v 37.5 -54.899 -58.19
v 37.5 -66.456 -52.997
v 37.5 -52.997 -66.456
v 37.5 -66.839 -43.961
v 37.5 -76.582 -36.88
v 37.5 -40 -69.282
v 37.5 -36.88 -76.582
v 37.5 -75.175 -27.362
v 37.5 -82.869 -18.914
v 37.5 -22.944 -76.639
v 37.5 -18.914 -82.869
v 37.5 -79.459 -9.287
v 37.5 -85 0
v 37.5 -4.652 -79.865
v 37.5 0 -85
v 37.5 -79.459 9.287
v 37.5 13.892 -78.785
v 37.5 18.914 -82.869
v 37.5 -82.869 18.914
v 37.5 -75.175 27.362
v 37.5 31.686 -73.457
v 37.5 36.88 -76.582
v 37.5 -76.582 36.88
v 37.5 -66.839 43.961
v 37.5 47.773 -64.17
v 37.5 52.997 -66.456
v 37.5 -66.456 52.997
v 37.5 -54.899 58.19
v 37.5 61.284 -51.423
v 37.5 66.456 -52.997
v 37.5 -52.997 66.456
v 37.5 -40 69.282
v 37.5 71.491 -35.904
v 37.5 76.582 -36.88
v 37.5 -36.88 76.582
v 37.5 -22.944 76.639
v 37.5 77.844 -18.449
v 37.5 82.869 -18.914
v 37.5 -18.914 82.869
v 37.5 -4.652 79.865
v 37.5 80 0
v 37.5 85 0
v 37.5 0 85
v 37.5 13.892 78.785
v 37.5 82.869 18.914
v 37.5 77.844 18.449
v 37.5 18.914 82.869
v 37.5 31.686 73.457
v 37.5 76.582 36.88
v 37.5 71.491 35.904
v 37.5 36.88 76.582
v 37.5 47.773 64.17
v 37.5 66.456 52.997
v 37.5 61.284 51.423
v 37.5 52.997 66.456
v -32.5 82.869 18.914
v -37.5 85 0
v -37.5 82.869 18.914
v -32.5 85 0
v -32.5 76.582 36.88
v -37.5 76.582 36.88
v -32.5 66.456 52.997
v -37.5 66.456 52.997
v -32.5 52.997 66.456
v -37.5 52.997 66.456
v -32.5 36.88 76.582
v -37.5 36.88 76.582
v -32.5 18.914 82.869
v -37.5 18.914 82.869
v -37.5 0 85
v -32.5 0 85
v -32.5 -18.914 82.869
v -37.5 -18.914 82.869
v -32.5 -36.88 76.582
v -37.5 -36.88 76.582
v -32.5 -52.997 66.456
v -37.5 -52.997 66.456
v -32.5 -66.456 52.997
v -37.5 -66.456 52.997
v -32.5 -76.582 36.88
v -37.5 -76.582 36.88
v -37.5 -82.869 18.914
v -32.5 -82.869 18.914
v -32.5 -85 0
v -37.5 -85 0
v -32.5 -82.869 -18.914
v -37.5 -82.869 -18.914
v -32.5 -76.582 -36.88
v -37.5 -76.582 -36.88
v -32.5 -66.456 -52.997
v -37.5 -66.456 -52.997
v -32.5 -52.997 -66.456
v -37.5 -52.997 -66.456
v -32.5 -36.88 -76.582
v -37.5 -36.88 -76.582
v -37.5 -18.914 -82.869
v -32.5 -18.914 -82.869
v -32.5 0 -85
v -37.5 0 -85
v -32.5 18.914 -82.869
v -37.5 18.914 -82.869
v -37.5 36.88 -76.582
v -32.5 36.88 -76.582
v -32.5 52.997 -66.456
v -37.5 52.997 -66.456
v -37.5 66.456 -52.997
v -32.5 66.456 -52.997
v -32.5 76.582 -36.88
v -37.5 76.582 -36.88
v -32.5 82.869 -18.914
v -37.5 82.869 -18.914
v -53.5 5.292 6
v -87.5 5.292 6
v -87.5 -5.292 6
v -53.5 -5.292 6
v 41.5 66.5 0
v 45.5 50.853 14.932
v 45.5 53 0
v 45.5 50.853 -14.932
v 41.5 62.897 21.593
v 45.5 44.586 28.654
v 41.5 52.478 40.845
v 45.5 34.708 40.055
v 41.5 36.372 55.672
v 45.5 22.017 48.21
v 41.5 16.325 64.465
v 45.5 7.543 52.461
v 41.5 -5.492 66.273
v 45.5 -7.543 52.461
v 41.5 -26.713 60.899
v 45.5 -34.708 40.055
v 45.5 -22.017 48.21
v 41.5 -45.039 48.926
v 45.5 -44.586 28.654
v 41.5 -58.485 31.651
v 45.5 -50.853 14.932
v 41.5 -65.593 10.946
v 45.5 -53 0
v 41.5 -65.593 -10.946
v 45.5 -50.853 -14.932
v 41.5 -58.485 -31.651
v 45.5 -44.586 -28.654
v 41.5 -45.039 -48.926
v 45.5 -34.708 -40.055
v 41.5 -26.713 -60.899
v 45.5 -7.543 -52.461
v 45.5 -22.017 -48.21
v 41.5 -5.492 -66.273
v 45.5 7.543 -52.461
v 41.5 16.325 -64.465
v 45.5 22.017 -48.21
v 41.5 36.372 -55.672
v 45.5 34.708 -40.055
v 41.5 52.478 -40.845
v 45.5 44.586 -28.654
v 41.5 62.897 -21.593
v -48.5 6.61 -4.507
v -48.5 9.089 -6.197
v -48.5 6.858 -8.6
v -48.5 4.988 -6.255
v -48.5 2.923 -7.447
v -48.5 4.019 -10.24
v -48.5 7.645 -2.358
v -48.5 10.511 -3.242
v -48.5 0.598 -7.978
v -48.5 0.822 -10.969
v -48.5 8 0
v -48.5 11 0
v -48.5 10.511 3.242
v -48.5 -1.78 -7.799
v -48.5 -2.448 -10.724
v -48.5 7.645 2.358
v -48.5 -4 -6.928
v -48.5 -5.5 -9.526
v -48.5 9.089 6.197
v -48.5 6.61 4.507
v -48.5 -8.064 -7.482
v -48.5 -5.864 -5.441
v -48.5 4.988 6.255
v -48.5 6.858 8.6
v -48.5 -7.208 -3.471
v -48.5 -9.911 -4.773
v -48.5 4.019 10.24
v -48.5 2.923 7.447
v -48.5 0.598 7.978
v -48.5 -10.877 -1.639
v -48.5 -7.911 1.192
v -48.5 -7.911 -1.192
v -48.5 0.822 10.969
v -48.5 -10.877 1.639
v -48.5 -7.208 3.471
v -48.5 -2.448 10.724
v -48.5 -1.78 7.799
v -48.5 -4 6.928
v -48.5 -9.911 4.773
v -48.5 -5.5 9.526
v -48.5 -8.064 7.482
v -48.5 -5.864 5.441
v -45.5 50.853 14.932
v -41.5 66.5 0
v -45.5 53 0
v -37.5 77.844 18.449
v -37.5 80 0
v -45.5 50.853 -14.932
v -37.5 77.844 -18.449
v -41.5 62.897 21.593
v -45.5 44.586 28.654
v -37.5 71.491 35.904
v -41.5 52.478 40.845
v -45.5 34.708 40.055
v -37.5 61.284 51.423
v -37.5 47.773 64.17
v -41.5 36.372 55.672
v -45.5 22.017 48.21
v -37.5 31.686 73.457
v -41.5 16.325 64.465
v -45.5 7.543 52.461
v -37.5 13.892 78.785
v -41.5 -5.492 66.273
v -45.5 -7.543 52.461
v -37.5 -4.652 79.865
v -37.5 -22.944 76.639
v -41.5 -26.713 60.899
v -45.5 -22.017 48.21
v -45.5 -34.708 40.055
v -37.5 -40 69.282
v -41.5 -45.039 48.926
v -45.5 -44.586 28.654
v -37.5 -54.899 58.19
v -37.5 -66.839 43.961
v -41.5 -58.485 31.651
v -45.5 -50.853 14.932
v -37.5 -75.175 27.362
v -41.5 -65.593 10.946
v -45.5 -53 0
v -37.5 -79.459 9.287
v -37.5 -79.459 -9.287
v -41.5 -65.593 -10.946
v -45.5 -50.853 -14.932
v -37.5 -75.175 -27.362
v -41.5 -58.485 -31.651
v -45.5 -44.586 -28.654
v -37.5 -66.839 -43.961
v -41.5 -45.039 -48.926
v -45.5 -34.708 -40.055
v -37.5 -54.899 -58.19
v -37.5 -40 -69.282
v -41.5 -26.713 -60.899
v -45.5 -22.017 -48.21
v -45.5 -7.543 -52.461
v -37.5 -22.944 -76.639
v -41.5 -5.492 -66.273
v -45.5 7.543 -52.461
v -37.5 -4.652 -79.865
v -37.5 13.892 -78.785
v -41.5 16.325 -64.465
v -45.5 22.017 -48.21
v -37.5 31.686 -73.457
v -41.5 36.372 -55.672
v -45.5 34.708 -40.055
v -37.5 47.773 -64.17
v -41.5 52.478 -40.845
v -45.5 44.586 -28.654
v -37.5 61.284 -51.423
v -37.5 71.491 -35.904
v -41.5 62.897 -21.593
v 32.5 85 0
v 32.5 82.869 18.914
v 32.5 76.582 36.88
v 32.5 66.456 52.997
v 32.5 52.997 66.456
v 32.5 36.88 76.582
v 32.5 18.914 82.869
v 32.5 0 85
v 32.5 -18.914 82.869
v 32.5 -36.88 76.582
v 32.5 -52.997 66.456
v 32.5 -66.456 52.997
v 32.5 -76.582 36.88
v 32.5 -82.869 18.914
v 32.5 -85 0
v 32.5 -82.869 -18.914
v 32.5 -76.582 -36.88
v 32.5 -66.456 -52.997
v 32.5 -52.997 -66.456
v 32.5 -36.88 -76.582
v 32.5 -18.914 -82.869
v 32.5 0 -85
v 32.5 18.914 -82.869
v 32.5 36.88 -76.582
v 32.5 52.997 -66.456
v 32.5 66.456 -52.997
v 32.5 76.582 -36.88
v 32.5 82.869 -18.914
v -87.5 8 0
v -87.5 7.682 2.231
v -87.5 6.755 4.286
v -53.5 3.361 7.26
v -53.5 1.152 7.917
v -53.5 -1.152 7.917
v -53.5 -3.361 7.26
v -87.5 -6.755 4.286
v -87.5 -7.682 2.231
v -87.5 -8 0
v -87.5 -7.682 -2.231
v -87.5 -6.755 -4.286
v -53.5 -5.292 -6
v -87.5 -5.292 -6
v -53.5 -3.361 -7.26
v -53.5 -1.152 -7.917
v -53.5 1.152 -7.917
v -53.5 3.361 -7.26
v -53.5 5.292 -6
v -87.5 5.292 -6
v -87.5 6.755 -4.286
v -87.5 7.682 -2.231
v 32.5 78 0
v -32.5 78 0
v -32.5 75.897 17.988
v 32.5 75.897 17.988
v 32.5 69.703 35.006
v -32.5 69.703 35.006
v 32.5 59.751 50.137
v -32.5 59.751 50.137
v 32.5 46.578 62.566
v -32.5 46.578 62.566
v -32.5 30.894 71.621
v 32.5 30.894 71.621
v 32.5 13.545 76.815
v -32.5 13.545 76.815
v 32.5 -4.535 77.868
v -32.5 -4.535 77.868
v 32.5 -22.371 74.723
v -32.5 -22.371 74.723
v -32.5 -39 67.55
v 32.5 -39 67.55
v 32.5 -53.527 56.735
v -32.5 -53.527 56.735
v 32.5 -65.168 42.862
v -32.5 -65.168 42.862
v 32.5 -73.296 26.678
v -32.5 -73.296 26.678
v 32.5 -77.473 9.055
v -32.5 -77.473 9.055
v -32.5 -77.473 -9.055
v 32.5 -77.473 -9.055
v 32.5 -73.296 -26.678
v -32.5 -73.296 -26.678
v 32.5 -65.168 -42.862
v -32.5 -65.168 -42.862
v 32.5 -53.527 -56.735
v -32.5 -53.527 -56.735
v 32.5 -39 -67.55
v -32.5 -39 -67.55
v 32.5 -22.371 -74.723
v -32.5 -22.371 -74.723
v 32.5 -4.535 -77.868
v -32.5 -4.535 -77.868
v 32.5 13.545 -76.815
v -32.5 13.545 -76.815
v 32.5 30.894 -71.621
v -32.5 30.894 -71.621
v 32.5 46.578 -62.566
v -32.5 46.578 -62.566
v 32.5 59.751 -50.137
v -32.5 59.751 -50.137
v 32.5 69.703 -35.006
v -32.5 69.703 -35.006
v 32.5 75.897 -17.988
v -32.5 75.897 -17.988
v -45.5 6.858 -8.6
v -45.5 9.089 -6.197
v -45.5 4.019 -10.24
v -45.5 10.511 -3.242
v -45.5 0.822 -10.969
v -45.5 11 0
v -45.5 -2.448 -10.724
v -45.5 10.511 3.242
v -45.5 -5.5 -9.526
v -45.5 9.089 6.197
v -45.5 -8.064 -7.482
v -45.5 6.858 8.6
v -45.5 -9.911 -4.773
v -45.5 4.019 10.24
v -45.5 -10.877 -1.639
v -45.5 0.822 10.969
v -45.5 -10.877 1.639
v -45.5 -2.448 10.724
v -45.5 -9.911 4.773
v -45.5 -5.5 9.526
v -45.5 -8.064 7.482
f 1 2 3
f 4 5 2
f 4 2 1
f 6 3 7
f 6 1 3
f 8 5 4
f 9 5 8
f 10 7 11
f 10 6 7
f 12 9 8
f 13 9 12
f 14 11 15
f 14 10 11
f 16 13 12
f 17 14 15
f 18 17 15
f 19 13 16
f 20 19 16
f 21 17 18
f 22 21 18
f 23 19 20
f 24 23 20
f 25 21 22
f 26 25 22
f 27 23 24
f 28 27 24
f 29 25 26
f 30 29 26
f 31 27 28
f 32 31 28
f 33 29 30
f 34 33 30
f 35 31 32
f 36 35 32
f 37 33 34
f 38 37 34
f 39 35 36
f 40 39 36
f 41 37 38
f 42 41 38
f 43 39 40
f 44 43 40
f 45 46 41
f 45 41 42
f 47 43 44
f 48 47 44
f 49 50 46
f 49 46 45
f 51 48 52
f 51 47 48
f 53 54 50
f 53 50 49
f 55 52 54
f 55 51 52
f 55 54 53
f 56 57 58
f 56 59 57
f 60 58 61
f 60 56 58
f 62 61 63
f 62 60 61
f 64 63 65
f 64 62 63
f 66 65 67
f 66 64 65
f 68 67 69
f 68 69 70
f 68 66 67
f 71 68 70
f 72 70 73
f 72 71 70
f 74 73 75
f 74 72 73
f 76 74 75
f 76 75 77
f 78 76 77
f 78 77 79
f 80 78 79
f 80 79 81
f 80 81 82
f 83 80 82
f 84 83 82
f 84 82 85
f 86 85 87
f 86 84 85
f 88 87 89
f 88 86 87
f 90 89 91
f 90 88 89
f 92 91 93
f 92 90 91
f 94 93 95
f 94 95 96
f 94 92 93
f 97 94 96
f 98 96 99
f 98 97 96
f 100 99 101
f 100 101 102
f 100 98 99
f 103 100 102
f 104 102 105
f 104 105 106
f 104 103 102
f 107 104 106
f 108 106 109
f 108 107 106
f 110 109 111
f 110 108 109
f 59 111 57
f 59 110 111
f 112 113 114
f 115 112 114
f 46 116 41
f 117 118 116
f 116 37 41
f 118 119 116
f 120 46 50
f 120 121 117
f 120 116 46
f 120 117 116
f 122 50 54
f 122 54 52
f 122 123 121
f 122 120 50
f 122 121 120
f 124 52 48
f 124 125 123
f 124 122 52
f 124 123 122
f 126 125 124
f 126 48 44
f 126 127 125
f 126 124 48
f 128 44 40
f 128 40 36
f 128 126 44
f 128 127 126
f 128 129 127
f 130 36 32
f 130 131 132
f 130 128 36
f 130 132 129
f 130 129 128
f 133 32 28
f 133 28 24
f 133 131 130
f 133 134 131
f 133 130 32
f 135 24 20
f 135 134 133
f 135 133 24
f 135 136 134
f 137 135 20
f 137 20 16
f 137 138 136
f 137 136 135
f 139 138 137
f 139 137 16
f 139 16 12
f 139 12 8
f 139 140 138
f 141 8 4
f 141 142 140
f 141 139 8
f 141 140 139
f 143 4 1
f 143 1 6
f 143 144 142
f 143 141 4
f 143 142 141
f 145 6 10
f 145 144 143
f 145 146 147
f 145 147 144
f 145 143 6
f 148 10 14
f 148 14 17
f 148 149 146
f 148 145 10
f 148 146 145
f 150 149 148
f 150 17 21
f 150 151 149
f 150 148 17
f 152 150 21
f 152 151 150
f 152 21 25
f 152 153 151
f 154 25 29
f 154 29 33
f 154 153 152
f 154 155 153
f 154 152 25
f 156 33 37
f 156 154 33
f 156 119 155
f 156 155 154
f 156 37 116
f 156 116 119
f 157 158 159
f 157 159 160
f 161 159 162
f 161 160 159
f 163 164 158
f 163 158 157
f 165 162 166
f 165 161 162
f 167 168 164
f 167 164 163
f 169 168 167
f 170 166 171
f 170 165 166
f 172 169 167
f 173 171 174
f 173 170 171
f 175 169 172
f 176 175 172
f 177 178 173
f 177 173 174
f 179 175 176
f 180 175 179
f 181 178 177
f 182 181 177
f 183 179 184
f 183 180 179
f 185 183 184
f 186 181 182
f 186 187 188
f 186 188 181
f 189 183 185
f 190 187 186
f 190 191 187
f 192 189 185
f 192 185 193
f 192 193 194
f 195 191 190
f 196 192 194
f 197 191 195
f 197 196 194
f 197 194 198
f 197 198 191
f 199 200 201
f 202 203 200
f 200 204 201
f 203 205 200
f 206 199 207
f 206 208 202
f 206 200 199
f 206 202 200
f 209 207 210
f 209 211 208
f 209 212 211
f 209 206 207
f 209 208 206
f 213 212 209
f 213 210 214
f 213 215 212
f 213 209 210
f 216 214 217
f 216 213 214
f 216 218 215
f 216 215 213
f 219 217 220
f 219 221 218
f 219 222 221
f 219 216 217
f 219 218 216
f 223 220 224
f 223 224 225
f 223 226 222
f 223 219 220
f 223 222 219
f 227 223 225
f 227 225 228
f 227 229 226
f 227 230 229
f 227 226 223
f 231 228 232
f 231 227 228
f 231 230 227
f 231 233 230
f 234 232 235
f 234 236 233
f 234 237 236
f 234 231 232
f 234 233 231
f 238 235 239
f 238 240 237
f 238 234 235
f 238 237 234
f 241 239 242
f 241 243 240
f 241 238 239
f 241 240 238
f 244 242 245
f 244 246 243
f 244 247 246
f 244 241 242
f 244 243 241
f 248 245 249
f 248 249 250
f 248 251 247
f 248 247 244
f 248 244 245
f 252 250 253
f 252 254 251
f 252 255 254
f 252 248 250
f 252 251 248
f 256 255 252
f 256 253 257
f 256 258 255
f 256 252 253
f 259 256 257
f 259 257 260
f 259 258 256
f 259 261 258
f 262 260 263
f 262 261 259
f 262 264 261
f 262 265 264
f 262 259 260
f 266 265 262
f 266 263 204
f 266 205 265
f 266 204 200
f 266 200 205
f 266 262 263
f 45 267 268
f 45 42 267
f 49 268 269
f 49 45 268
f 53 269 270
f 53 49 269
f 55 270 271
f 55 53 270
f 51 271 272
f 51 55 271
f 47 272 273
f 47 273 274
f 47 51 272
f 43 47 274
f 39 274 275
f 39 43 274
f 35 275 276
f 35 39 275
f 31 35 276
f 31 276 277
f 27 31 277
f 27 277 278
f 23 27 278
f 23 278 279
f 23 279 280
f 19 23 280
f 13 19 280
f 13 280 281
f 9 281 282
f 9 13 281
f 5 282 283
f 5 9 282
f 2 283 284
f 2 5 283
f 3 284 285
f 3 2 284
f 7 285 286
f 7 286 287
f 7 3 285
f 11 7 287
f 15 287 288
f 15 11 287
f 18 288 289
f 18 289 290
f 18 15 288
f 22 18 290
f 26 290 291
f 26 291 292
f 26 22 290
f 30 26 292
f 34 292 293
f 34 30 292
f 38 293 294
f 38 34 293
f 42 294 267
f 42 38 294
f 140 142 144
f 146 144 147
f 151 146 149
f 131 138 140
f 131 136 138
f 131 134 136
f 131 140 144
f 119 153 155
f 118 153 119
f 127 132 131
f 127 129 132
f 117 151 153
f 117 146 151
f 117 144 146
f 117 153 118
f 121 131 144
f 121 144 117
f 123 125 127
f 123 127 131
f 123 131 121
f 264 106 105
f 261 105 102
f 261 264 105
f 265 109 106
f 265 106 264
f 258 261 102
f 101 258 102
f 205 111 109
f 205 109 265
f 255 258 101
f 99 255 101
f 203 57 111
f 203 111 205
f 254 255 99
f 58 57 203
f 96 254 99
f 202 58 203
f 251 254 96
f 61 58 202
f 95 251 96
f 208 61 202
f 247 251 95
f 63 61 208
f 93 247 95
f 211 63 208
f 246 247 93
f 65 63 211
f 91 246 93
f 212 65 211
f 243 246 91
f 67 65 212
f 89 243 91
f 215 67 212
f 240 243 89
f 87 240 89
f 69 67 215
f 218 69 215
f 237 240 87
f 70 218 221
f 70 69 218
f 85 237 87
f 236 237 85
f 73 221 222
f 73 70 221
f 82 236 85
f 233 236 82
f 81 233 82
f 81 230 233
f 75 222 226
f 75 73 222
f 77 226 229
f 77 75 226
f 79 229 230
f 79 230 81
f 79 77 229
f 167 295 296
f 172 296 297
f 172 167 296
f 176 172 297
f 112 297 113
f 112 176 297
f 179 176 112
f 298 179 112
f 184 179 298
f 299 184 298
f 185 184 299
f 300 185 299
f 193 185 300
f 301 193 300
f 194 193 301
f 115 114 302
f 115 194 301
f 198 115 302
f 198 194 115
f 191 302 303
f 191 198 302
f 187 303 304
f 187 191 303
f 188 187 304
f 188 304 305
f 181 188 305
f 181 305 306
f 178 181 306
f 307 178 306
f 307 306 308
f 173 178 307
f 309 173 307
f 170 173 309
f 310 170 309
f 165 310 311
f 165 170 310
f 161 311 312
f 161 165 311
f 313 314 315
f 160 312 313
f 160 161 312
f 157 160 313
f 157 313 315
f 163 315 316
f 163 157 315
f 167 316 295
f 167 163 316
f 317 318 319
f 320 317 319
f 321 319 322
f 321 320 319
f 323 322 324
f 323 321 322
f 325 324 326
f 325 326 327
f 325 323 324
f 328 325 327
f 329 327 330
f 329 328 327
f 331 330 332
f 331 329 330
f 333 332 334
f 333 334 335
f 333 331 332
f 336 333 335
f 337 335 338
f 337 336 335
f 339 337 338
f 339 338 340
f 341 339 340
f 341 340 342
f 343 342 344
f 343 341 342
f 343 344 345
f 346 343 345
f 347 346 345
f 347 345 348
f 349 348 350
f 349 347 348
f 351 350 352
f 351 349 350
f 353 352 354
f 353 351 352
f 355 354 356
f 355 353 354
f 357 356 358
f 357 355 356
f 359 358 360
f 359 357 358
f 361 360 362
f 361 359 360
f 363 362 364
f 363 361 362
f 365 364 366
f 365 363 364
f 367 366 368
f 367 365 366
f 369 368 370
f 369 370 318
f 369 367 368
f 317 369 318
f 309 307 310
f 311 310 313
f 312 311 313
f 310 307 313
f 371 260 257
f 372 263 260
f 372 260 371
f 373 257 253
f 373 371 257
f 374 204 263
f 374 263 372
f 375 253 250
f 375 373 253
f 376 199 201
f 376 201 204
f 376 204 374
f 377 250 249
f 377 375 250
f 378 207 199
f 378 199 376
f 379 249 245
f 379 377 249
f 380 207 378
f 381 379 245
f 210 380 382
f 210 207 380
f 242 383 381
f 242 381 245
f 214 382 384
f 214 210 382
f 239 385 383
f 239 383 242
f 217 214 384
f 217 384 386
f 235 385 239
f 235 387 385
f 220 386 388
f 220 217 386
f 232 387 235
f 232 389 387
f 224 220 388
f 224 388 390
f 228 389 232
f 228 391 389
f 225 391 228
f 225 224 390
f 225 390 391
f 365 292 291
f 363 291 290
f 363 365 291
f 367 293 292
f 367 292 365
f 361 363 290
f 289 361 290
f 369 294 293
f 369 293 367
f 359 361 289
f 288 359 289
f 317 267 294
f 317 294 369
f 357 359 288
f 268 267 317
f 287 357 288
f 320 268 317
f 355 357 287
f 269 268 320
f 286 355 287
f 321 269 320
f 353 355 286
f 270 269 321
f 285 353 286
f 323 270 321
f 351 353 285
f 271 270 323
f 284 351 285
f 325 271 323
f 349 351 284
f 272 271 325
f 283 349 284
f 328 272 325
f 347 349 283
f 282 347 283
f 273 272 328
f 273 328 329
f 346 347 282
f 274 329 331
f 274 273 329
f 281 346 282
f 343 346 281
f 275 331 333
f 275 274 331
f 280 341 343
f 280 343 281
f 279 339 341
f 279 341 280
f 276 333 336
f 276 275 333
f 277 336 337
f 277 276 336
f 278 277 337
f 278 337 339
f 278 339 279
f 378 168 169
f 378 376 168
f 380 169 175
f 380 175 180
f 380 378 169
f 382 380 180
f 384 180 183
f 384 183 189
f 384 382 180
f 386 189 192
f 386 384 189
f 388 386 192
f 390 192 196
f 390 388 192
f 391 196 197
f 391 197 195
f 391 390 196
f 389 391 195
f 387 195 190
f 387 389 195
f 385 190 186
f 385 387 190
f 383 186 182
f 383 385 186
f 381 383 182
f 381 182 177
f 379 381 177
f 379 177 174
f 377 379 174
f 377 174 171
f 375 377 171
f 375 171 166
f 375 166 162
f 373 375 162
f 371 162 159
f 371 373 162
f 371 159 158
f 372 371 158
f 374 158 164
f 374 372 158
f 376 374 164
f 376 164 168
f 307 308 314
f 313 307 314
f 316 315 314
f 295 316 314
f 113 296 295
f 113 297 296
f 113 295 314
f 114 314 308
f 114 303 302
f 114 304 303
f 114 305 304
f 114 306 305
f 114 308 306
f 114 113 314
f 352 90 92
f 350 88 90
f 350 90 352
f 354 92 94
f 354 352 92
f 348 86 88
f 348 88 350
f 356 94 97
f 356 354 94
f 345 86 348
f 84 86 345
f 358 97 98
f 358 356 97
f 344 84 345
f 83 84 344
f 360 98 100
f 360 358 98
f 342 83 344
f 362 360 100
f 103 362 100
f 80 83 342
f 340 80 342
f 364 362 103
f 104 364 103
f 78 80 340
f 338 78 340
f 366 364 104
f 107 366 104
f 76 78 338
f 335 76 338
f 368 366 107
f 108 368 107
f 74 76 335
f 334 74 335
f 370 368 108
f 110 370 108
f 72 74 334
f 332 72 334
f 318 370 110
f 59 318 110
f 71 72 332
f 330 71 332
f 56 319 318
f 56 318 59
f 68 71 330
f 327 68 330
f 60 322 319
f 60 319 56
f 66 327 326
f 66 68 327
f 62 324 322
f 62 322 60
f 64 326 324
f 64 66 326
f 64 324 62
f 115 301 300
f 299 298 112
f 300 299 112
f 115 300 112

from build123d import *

# Parameters (mm, degrees)
CUT_EXTRUDE_START    = -53.5
SKETCH_2_OUTSIDE_W   = 231.472
SKETCH_2_OUTSIDE_H   = 231.472
CUT_EXTRUDE_1_DEPTH  = 35
CUT_EXTRUDE_START_2  = 53.5
SKETCH_2_2_OUTSIDE_W = 231.472
SKETCH_2_2_OUTSIDE_H = 231.472
CUT_EXTRUDE_2_DEPTH  = 35
SKETCH_3_R           = 53
CUT_EXTRUDE_3_DEPTH  = 42


with BuildPart() as part:
    # Эскиз1 → Повернуть1 (revolve)
    with BuildSketch(Plane.XY):
        Polygon((32.5, 85), (37.5, 85), (37.5, 80), (45.5, 53), (45.5, 11), (48.5, 11), (48.5, 8), (87.5, 8), (87.5, 0), (-87.5, 0), (-87.5, 8), (-48.5, 8), (-48.5, 11), (-45.5, 11), (-45.5, 53), (-37.5, 80), (-37.5, 85), (-32.5, 85), (-32.5, 78), (32.5, 78), align=None)
    revolve(axis=Axis((-1100.903674864, 0, 0), (1, 0, 0)))

    # Эскиз2 outside → Вырез-Вытянуть1 (cut, through all)
    with BuildSketch(Plane(origin=(0, 0, 0), x_dir=(0, 0, -1), z_dir=(1, 0, 0)).offset(CUT_EXTRUDE_START)):
        Rectangle(SKETCH_2_OUTSIDE_W, SKETCH_2_OUTSIDE_H)
        with BuildLine():
            Line((-6, 5.291502622), (-6, -5.291502622))
            ThreePointArc((-6, -5.291502622), (0, -8), (6, -5.291502622))
            Line((6, -5.291502622), (6, 5.291502622))
            ThreePointArc((6, 5.291502622), (0, 8), (-6, 5.291502622))
        make_face(mode=Mode.SUBTRACT)
    extrude(amount=-CUT_EXTRUDE_1_DEPTH, mode=Mode.SUBTRACT)

    # Эскиз2<2> outside → Вырез-Вытянуть2 (cut, through all)
    with BuildSketch(Plane(origin=(0, 0, 0), x_dir=(0, 0, -1), z_dir=(1, 0, 0)).offset(CUT_EXTRUDE_START_2)):
        Rectangle(SKETCH_2_2_OUTSIDE_W, SKETCH_2_2_OUTSIDE_H)
        with BuildLine():
            Line((-6, 5.291502622), (-6, -5.291502622))
            ThreePointArc((-6, -5.291502622), (0, -8), (6, -5.291502622))
            Line((6, -5.291502622), (6, 5.291502622))
            ThreePointArc((6, 5.291502622), (0, 8), (-6, 5.291502622))
        make_face(mode=Mode.SUBTRACT)
    extrude(amount=CUT_EXTRUDE_2_DEPTH, mode=Mode.SUBTRACT)

    # Эскиз3 → Вырез-Вытянуть3 (cut)
    with BuildSketch(Plane(origin=(87.5, 0, 0), x_dir=(0, 0, -1), z_dir=(1, 0, 0))):
        Circle(SKETCH_3_R)
    extrude(amount=-CUT_EXTRUDE_3_DEPTH, mode=Mode.SUBTRACT)


solid = part.part
